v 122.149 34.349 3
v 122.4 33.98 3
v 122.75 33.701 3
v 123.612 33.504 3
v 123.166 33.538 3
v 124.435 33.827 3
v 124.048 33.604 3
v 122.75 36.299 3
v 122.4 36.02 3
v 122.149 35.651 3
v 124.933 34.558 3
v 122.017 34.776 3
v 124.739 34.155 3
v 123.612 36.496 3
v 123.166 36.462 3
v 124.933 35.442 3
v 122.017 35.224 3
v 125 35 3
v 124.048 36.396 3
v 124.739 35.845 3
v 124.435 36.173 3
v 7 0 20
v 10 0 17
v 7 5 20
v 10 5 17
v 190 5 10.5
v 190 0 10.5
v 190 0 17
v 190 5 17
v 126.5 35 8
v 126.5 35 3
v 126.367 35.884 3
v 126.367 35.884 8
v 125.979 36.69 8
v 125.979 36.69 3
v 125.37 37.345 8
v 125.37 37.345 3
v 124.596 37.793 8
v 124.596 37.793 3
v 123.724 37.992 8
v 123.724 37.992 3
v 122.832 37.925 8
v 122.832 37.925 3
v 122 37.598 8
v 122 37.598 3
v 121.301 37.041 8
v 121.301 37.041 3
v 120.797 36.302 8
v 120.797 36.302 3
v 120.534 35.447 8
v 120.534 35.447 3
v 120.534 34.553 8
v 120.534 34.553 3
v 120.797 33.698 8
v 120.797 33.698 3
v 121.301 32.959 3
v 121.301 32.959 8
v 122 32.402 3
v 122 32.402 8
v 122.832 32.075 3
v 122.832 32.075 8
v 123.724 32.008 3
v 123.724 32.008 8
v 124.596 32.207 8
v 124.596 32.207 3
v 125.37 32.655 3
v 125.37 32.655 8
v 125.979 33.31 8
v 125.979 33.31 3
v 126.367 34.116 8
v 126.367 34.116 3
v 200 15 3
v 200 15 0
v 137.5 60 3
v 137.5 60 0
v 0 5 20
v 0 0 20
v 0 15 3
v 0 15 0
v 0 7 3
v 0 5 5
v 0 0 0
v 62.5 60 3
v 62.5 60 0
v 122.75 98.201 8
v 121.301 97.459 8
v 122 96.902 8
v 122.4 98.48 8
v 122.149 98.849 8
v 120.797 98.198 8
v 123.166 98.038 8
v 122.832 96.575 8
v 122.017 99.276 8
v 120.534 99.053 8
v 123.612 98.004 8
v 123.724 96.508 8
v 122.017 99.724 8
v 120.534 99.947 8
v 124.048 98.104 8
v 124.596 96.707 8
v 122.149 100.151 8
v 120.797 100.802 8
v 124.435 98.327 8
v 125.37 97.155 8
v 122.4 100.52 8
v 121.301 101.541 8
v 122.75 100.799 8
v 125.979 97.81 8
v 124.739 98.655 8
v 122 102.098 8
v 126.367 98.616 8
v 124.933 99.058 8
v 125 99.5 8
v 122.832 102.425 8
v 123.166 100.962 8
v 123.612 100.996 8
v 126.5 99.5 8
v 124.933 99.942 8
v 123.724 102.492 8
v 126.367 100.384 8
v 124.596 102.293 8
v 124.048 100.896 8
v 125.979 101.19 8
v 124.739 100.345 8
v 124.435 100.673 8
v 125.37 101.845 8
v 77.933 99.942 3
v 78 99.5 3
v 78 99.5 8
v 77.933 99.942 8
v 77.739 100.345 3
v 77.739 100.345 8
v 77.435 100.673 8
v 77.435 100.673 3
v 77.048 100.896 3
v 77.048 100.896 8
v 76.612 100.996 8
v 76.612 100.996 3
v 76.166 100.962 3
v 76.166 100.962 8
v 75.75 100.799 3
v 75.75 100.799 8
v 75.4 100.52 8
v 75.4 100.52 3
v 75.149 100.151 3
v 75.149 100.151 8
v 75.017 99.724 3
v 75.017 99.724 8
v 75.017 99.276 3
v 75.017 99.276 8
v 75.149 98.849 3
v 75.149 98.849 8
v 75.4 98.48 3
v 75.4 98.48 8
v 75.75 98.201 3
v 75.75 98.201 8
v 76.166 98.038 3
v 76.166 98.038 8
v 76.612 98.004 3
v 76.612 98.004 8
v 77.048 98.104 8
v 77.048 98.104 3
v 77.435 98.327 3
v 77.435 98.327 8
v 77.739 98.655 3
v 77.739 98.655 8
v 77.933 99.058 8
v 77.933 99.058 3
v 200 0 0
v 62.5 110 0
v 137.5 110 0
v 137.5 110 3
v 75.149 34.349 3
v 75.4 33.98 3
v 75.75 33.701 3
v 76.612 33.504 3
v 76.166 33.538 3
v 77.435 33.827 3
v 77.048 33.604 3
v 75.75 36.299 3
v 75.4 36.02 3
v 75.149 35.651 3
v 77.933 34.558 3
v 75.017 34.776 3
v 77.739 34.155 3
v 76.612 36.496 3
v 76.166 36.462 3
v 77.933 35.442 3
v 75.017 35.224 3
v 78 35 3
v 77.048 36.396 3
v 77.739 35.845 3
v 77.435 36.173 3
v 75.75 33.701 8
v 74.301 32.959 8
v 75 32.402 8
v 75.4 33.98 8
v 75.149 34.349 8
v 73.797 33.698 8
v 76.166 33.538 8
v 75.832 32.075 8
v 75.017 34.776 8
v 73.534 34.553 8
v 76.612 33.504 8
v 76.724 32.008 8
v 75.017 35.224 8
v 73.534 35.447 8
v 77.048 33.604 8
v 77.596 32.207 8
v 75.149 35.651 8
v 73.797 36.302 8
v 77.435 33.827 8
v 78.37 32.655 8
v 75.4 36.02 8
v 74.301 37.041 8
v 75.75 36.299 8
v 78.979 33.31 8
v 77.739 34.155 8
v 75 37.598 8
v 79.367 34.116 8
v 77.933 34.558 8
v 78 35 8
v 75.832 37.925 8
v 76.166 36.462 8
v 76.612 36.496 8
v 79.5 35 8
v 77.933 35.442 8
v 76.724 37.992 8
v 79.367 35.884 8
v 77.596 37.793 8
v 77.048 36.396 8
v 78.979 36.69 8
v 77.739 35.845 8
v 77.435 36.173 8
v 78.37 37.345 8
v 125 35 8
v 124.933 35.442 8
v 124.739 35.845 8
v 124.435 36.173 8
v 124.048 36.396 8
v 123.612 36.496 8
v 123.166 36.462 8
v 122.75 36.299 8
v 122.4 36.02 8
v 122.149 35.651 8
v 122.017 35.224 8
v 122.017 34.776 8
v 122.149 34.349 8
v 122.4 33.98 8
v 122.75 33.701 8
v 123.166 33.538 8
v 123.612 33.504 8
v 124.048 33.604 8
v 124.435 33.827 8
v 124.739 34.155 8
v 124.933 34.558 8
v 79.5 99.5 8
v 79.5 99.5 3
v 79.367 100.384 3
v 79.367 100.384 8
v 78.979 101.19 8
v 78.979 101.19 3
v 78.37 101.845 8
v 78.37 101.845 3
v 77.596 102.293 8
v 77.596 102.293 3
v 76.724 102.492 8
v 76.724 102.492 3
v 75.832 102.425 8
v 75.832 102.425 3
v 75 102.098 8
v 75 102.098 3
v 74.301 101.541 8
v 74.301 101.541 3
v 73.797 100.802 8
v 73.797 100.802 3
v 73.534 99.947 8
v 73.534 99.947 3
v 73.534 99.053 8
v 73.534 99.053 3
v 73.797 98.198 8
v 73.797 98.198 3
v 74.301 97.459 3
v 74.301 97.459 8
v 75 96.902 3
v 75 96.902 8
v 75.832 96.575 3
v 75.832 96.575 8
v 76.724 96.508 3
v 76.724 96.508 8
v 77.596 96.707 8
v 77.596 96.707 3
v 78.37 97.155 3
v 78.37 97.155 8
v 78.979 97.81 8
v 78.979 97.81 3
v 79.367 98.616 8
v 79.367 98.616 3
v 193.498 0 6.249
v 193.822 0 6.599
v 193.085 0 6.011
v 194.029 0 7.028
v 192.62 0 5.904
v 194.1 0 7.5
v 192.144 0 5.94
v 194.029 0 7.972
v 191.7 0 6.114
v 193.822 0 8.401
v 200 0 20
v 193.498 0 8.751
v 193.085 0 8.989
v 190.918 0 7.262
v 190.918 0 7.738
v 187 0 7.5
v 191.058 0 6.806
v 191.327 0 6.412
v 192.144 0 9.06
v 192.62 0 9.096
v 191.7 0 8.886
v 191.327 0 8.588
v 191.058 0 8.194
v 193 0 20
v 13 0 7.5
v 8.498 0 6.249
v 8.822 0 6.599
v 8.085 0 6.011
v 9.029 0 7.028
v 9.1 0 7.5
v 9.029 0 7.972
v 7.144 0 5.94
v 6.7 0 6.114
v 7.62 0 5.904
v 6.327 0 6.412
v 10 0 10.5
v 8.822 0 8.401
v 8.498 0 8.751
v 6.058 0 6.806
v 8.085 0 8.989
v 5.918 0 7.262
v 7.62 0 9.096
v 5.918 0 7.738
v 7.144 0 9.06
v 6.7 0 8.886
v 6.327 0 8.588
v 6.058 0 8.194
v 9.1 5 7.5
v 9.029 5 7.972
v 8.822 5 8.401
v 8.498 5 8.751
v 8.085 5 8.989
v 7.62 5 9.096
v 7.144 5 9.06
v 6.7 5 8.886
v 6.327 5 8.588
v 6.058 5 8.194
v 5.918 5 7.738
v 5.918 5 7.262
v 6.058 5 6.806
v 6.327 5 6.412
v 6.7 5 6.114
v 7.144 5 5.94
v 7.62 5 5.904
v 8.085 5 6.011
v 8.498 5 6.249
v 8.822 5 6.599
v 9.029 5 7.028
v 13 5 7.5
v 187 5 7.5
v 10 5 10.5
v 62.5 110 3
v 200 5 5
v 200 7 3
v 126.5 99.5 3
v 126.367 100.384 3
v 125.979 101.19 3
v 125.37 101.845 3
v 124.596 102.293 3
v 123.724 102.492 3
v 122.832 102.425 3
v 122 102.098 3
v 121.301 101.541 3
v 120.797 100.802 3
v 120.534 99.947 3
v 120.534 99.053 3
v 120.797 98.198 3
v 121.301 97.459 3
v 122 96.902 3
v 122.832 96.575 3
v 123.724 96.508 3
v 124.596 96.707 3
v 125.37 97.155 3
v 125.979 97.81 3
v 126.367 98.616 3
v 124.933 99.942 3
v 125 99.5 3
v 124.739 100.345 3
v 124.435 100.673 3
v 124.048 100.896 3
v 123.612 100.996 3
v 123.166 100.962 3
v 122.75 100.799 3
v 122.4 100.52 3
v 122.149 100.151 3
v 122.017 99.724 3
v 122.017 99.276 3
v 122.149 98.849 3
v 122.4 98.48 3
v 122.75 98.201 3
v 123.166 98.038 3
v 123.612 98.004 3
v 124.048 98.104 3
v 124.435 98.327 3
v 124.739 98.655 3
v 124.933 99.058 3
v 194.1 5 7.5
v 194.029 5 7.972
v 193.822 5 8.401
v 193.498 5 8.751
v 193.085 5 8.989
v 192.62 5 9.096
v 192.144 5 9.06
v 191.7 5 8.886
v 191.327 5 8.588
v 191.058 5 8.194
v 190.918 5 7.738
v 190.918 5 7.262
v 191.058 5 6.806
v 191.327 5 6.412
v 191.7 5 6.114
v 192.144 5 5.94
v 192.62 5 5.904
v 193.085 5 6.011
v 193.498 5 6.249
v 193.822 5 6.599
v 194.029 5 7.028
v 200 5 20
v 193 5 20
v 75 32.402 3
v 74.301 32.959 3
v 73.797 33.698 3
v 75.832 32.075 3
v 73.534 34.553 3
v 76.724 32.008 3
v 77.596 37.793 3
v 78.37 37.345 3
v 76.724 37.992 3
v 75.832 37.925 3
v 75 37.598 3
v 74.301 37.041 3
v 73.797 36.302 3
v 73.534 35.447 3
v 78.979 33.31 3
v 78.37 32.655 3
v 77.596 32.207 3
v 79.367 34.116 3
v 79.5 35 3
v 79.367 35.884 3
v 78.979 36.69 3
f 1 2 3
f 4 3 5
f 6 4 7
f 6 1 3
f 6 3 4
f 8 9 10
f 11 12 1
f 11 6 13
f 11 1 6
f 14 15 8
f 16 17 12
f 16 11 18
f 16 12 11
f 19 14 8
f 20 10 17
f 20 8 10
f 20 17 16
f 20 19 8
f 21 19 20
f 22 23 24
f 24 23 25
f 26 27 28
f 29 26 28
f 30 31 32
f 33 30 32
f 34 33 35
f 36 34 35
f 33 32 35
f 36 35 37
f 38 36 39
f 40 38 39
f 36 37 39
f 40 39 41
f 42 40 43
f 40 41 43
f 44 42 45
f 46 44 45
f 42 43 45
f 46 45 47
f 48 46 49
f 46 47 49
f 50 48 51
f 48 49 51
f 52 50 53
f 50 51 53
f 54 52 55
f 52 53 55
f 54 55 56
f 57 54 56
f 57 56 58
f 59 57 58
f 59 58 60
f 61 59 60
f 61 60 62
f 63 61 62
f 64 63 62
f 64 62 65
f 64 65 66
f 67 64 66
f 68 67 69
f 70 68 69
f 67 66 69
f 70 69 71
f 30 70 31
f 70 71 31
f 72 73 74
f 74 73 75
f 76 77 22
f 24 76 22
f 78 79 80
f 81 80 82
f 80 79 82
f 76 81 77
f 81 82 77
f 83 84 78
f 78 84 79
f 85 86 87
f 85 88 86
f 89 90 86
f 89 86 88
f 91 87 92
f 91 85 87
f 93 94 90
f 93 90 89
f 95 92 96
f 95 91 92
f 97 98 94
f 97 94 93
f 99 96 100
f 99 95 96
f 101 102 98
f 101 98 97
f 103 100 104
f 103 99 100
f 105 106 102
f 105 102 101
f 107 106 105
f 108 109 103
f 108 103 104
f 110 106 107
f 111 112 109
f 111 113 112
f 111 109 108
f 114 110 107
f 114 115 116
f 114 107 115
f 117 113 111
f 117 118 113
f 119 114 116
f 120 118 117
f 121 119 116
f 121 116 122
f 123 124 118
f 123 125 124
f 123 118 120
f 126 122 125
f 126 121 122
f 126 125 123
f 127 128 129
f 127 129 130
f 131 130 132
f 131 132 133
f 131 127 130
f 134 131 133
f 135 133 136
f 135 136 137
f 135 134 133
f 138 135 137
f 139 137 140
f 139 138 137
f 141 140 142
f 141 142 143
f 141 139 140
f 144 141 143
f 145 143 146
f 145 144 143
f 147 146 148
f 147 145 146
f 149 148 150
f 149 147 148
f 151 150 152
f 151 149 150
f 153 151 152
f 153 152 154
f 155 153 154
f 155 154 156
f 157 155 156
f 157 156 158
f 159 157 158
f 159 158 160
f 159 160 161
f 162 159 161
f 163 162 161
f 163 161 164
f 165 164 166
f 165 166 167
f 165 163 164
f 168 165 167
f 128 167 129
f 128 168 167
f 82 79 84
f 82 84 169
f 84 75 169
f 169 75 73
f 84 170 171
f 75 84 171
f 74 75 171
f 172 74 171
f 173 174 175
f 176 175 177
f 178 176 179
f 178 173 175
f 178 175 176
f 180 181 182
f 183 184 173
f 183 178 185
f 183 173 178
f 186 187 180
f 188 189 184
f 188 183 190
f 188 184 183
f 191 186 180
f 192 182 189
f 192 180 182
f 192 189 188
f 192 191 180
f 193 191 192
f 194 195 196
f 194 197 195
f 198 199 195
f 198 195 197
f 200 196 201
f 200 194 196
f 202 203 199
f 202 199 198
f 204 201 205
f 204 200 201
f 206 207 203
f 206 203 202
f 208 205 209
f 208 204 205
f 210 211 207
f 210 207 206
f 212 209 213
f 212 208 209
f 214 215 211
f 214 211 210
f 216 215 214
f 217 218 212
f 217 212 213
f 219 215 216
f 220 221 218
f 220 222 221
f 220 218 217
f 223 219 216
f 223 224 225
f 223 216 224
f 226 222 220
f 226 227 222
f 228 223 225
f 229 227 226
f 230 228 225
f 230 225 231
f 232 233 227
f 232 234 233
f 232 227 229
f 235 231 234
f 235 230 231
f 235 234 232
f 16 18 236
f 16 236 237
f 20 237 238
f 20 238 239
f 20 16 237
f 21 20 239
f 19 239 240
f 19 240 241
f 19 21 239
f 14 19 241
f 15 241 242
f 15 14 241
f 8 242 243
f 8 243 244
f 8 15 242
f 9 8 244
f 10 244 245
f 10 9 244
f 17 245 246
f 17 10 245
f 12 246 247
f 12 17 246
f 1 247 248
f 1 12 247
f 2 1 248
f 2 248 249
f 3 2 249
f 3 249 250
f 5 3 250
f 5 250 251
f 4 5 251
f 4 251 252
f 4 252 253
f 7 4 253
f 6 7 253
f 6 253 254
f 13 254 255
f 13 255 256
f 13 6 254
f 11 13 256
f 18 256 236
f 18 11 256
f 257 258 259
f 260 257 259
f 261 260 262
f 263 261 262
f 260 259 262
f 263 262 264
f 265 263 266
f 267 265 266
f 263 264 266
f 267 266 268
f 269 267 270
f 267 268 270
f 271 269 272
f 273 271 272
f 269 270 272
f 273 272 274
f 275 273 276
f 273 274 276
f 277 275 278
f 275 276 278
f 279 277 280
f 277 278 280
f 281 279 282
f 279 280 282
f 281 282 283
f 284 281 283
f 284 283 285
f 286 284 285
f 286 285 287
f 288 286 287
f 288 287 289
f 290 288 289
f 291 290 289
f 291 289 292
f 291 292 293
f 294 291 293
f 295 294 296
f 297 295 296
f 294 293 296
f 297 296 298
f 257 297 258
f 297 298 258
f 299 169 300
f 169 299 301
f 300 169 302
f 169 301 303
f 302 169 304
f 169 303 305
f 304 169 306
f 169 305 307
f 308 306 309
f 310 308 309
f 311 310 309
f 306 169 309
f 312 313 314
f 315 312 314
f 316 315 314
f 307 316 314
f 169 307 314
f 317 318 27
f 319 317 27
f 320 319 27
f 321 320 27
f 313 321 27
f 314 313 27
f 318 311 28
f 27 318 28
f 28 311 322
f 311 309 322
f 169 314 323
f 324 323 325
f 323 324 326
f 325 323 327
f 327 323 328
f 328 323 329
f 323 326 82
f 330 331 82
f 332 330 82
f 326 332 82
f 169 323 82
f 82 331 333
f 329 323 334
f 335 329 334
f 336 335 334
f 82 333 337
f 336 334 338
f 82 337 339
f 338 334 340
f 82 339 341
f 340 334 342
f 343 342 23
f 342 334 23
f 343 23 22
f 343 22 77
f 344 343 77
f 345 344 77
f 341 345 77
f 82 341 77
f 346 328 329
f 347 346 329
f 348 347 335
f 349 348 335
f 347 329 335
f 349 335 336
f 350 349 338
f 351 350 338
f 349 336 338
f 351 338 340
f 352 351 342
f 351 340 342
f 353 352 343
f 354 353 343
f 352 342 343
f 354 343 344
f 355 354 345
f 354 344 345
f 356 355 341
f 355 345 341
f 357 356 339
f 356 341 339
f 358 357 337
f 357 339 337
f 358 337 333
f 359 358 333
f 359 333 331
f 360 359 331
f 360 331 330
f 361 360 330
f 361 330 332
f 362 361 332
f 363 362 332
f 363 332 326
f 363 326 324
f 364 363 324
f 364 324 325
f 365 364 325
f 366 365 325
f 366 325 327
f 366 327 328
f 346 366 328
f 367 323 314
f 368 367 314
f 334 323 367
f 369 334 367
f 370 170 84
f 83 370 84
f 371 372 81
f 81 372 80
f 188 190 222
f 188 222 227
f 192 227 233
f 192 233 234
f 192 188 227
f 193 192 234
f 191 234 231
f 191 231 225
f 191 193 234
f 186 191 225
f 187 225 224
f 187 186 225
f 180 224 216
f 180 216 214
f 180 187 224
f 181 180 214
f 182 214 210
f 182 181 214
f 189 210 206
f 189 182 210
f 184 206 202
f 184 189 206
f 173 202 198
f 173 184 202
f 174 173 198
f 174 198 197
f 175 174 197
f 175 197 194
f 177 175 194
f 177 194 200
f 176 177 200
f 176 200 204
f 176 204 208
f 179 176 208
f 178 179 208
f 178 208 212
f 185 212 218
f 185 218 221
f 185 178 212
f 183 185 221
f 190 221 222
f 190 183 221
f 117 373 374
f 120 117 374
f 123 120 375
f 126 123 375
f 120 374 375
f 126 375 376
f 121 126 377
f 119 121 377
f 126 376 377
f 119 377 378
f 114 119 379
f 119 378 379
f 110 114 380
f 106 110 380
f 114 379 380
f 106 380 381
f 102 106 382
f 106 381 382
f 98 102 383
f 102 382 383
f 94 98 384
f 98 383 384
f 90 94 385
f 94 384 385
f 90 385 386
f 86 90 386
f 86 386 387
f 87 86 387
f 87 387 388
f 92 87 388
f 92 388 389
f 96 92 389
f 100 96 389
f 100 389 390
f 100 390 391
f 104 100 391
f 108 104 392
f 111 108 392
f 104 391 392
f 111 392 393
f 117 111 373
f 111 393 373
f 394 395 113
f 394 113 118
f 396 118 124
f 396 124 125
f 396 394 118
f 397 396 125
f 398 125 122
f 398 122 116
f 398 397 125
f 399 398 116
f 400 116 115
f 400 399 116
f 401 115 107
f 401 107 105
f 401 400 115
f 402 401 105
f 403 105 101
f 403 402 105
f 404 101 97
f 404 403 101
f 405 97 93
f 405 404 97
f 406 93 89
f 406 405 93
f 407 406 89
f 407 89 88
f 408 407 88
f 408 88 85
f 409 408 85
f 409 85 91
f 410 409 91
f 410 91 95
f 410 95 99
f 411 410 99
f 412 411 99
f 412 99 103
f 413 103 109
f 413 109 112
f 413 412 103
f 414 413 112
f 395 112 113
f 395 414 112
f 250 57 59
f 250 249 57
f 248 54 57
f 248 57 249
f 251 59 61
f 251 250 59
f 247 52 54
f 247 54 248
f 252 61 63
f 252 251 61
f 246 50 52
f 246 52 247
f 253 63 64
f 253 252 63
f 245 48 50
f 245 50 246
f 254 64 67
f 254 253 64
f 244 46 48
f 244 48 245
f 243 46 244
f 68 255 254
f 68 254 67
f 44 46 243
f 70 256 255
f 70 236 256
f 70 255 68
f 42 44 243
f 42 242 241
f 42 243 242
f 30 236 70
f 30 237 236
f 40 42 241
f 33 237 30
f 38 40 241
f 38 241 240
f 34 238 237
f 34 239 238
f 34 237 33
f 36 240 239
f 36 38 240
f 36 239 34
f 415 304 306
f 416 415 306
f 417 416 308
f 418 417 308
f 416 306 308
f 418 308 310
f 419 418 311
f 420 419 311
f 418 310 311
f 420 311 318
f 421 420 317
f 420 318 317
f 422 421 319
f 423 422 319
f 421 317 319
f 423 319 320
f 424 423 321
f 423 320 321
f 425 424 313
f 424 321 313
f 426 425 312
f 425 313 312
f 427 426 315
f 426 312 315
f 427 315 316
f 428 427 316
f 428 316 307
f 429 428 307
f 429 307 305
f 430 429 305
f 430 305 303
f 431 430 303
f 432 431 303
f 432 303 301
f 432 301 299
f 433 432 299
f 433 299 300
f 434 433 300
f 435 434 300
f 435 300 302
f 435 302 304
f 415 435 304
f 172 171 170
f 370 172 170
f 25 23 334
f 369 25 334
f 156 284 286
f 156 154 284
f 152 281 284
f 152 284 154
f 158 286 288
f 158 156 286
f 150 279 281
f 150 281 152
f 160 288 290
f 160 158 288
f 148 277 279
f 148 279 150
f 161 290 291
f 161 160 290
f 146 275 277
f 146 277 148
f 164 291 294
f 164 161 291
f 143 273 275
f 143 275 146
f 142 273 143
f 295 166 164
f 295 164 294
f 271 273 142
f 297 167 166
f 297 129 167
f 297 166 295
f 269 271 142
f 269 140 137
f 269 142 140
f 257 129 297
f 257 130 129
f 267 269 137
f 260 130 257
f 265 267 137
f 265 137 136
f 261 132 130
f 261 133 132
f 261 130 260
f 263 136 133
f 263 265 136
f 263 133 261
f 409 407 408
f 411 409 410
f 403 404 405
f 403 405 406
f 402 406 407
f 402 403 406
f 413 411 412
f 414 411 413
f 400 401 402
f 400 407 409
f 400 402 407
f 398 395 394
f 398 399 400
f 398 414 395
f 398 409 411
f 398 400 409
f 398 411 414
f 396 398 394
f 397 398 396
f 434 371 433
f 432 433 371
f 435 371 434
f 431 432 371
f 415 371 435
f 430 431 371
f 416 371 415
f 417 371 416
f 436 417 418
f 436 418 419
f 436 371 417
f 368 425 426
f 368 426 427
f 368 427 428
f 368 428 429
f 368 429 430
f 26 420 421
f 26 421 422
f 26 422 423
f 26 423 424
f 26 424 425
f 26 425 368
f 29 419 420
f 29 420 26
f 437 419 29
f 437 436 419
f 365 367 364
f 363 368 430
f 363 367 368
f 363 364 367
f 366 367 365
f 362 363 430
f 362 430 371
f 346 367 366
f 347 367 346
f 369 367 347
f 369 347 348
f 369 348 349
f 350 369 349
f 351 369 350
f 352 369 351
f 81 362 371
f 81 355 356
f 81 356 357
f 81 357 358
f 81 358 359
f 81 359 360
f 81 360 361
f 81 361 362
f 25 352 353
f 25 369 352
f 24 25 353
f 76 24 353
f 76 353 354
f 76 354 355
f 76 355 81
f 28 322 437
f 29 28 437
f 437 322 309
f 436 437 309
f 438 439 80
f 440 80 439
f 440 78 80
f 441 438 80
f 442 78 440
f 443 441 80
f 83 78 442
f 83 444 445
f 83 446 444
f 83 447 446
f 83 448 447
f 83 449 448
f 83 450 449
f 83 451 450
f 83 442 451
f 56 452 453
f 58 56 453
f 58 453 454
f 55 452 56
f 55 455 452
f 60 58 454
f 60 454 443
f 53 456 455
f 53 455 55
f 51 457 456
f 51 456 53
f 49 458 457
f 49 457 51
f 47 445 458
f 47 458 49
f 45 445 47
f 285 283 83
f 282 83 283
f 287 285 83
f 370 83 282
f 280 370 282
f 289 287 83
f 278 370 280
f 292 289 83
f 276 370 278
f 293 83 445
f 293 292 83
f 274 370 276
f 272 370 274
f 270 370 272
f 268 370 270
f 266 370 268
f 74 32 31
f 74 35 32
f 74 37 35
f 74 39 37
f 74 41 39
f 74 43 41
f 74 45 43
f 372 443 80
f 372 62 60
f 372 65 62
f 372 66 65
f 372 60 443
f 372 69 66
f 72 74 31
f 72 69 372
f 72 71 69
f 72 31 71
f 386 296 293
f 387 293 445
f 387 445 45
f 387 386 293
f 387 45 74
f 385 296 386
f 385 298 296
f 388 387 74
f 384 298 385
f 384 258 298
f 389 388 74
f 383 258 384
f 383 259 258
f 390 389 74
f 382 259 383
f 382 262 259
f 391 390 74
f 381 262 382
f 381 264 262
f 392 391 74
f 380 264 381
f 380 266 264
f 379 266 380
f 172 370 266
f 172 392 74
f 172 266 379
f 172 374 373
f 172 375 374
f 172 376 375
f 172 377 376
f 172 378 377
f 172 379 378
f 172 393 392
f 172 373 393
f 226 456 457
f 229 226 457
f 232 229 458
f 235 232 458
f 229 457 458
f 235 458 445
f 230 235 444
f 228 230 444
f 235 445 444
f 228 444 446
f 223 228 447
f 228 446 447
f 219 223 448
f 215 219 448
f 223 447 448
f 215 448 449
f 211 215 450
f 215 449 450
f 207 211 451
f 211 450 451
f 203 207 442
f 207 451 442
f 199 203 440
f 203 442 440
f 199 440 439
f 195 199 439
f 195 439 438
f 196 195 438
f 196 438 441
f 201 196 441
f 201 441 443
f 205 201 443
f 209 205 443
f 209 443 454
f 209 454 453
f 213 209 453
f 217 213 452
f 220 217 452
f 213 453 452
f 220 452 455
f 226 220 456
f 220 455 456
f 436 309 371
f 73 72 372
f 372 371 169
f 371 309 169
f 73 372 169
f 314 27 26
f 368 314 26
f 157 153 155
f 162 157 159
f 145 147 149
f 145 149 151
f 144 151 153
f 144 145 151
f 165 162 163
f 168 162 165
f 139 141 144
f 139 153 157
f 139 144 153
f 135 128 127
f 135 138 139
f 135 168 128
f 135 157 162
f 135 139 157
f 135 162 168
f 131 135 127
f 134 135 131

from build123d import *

# Parameters (mm, degrees)
PAD_DEPTH       = 3
PAD001_DEPTH    = 5
SKETCH002_R     = 1.6
POCKET_DEPTH    = 110.001
SKETCH003_R     = 3
SKETCH003_R_2   = 1.5
PAD002_DEPTH    = 5
CHAMFER_SIZE    = 3
CHAMFER001_SIZE = 2


with BuildPart() as part:
    # Sketch → Pad (new body)
    with BuildSketch(Plane.XY):
        Polygon((0, 0), (200, 0), (200, 15), (137.5, 60), (137.5, 110), (62.5, 110), (62.5, 60), (0, 15), align=None)
    extrude(amount=PAD_DEPTH)

    # Sketch001 (on Face1 of Pad) → Pad001 (join)
    with BuildSketch(Plane.XZ):
        Polygon((0, 3), (0, 20), (10, 20), (10, 7.5), (190, 7.5), (190, 20), (200, 20), (200, 3), align=None)
    extrude(amount=-PAD001_DEPTH)

    # Sketch002 (on Face14 of Pad001) → Pocket (cut, through all)
    with BuildSketch(Plane.XZ):
        with Locations((7.5, 7.5)):
            Circle(SKETCH002_R)
        with Locations((192.5, 7.5)):
            Circle(SKETCH002_R)
    extrude(amount=-POCKET_DEPTH, mode=Mode.SUBTRACT)

    # Sketch003 (on Face7 of Pocket) → Pad002 (join)
    with BuildSketch(Plane.XY.offset(3)):
        with Locations((76.5, 99.5)):
            Circle(SKETCH003_R)
        with Locations((76.5, 99.5)):
            Circle(SKETCH003_R_2, mode=Mode.SUBTRACT)
        with Locations((123.5, 99.5)):
            Circle(SKETCH003_R)
        with Locations((123.5, 99.5)):
            Circle(SKETCH003_R_2, mode=Mode.SUBTRACT)
        with Locations((123.5, 35)):
            Circle(SKETCH003_R)
        with Locations((123.5, 35)):
            Circle(SKETCH003_R_2, mode=Mode.SUBTRACT)
        with Locations((76.5, 35)):
            Circle(SKETCH003_R)
        with Locations((76.5, 35)):
            Circle(SKETCH003_R_2, mode=Mode.SUBTRACT)
    extrude(amount=PAD002_DEPTH)

    # Chamfer
    chamfer_edges = [part.edges().sort_by_distance(p)[0] for p in [
        (10, 2.5, 7.5),
        (190, 2.5, 7.5),
        (190, 2.5, 20),
        (10, 2.5, 20),
    ]]
    chamfer(chamfer_edges, length=CHAMFER_SIZE)

    # Chamfer001
    chamfer001_edges = [part.edges().sort_by_distance(p)[0] for p in [
        (100, 5, 3),
    ]]
    chamfer(chamfer001_edges, length=CHAMFER001_SIZE)


solid = part.part
